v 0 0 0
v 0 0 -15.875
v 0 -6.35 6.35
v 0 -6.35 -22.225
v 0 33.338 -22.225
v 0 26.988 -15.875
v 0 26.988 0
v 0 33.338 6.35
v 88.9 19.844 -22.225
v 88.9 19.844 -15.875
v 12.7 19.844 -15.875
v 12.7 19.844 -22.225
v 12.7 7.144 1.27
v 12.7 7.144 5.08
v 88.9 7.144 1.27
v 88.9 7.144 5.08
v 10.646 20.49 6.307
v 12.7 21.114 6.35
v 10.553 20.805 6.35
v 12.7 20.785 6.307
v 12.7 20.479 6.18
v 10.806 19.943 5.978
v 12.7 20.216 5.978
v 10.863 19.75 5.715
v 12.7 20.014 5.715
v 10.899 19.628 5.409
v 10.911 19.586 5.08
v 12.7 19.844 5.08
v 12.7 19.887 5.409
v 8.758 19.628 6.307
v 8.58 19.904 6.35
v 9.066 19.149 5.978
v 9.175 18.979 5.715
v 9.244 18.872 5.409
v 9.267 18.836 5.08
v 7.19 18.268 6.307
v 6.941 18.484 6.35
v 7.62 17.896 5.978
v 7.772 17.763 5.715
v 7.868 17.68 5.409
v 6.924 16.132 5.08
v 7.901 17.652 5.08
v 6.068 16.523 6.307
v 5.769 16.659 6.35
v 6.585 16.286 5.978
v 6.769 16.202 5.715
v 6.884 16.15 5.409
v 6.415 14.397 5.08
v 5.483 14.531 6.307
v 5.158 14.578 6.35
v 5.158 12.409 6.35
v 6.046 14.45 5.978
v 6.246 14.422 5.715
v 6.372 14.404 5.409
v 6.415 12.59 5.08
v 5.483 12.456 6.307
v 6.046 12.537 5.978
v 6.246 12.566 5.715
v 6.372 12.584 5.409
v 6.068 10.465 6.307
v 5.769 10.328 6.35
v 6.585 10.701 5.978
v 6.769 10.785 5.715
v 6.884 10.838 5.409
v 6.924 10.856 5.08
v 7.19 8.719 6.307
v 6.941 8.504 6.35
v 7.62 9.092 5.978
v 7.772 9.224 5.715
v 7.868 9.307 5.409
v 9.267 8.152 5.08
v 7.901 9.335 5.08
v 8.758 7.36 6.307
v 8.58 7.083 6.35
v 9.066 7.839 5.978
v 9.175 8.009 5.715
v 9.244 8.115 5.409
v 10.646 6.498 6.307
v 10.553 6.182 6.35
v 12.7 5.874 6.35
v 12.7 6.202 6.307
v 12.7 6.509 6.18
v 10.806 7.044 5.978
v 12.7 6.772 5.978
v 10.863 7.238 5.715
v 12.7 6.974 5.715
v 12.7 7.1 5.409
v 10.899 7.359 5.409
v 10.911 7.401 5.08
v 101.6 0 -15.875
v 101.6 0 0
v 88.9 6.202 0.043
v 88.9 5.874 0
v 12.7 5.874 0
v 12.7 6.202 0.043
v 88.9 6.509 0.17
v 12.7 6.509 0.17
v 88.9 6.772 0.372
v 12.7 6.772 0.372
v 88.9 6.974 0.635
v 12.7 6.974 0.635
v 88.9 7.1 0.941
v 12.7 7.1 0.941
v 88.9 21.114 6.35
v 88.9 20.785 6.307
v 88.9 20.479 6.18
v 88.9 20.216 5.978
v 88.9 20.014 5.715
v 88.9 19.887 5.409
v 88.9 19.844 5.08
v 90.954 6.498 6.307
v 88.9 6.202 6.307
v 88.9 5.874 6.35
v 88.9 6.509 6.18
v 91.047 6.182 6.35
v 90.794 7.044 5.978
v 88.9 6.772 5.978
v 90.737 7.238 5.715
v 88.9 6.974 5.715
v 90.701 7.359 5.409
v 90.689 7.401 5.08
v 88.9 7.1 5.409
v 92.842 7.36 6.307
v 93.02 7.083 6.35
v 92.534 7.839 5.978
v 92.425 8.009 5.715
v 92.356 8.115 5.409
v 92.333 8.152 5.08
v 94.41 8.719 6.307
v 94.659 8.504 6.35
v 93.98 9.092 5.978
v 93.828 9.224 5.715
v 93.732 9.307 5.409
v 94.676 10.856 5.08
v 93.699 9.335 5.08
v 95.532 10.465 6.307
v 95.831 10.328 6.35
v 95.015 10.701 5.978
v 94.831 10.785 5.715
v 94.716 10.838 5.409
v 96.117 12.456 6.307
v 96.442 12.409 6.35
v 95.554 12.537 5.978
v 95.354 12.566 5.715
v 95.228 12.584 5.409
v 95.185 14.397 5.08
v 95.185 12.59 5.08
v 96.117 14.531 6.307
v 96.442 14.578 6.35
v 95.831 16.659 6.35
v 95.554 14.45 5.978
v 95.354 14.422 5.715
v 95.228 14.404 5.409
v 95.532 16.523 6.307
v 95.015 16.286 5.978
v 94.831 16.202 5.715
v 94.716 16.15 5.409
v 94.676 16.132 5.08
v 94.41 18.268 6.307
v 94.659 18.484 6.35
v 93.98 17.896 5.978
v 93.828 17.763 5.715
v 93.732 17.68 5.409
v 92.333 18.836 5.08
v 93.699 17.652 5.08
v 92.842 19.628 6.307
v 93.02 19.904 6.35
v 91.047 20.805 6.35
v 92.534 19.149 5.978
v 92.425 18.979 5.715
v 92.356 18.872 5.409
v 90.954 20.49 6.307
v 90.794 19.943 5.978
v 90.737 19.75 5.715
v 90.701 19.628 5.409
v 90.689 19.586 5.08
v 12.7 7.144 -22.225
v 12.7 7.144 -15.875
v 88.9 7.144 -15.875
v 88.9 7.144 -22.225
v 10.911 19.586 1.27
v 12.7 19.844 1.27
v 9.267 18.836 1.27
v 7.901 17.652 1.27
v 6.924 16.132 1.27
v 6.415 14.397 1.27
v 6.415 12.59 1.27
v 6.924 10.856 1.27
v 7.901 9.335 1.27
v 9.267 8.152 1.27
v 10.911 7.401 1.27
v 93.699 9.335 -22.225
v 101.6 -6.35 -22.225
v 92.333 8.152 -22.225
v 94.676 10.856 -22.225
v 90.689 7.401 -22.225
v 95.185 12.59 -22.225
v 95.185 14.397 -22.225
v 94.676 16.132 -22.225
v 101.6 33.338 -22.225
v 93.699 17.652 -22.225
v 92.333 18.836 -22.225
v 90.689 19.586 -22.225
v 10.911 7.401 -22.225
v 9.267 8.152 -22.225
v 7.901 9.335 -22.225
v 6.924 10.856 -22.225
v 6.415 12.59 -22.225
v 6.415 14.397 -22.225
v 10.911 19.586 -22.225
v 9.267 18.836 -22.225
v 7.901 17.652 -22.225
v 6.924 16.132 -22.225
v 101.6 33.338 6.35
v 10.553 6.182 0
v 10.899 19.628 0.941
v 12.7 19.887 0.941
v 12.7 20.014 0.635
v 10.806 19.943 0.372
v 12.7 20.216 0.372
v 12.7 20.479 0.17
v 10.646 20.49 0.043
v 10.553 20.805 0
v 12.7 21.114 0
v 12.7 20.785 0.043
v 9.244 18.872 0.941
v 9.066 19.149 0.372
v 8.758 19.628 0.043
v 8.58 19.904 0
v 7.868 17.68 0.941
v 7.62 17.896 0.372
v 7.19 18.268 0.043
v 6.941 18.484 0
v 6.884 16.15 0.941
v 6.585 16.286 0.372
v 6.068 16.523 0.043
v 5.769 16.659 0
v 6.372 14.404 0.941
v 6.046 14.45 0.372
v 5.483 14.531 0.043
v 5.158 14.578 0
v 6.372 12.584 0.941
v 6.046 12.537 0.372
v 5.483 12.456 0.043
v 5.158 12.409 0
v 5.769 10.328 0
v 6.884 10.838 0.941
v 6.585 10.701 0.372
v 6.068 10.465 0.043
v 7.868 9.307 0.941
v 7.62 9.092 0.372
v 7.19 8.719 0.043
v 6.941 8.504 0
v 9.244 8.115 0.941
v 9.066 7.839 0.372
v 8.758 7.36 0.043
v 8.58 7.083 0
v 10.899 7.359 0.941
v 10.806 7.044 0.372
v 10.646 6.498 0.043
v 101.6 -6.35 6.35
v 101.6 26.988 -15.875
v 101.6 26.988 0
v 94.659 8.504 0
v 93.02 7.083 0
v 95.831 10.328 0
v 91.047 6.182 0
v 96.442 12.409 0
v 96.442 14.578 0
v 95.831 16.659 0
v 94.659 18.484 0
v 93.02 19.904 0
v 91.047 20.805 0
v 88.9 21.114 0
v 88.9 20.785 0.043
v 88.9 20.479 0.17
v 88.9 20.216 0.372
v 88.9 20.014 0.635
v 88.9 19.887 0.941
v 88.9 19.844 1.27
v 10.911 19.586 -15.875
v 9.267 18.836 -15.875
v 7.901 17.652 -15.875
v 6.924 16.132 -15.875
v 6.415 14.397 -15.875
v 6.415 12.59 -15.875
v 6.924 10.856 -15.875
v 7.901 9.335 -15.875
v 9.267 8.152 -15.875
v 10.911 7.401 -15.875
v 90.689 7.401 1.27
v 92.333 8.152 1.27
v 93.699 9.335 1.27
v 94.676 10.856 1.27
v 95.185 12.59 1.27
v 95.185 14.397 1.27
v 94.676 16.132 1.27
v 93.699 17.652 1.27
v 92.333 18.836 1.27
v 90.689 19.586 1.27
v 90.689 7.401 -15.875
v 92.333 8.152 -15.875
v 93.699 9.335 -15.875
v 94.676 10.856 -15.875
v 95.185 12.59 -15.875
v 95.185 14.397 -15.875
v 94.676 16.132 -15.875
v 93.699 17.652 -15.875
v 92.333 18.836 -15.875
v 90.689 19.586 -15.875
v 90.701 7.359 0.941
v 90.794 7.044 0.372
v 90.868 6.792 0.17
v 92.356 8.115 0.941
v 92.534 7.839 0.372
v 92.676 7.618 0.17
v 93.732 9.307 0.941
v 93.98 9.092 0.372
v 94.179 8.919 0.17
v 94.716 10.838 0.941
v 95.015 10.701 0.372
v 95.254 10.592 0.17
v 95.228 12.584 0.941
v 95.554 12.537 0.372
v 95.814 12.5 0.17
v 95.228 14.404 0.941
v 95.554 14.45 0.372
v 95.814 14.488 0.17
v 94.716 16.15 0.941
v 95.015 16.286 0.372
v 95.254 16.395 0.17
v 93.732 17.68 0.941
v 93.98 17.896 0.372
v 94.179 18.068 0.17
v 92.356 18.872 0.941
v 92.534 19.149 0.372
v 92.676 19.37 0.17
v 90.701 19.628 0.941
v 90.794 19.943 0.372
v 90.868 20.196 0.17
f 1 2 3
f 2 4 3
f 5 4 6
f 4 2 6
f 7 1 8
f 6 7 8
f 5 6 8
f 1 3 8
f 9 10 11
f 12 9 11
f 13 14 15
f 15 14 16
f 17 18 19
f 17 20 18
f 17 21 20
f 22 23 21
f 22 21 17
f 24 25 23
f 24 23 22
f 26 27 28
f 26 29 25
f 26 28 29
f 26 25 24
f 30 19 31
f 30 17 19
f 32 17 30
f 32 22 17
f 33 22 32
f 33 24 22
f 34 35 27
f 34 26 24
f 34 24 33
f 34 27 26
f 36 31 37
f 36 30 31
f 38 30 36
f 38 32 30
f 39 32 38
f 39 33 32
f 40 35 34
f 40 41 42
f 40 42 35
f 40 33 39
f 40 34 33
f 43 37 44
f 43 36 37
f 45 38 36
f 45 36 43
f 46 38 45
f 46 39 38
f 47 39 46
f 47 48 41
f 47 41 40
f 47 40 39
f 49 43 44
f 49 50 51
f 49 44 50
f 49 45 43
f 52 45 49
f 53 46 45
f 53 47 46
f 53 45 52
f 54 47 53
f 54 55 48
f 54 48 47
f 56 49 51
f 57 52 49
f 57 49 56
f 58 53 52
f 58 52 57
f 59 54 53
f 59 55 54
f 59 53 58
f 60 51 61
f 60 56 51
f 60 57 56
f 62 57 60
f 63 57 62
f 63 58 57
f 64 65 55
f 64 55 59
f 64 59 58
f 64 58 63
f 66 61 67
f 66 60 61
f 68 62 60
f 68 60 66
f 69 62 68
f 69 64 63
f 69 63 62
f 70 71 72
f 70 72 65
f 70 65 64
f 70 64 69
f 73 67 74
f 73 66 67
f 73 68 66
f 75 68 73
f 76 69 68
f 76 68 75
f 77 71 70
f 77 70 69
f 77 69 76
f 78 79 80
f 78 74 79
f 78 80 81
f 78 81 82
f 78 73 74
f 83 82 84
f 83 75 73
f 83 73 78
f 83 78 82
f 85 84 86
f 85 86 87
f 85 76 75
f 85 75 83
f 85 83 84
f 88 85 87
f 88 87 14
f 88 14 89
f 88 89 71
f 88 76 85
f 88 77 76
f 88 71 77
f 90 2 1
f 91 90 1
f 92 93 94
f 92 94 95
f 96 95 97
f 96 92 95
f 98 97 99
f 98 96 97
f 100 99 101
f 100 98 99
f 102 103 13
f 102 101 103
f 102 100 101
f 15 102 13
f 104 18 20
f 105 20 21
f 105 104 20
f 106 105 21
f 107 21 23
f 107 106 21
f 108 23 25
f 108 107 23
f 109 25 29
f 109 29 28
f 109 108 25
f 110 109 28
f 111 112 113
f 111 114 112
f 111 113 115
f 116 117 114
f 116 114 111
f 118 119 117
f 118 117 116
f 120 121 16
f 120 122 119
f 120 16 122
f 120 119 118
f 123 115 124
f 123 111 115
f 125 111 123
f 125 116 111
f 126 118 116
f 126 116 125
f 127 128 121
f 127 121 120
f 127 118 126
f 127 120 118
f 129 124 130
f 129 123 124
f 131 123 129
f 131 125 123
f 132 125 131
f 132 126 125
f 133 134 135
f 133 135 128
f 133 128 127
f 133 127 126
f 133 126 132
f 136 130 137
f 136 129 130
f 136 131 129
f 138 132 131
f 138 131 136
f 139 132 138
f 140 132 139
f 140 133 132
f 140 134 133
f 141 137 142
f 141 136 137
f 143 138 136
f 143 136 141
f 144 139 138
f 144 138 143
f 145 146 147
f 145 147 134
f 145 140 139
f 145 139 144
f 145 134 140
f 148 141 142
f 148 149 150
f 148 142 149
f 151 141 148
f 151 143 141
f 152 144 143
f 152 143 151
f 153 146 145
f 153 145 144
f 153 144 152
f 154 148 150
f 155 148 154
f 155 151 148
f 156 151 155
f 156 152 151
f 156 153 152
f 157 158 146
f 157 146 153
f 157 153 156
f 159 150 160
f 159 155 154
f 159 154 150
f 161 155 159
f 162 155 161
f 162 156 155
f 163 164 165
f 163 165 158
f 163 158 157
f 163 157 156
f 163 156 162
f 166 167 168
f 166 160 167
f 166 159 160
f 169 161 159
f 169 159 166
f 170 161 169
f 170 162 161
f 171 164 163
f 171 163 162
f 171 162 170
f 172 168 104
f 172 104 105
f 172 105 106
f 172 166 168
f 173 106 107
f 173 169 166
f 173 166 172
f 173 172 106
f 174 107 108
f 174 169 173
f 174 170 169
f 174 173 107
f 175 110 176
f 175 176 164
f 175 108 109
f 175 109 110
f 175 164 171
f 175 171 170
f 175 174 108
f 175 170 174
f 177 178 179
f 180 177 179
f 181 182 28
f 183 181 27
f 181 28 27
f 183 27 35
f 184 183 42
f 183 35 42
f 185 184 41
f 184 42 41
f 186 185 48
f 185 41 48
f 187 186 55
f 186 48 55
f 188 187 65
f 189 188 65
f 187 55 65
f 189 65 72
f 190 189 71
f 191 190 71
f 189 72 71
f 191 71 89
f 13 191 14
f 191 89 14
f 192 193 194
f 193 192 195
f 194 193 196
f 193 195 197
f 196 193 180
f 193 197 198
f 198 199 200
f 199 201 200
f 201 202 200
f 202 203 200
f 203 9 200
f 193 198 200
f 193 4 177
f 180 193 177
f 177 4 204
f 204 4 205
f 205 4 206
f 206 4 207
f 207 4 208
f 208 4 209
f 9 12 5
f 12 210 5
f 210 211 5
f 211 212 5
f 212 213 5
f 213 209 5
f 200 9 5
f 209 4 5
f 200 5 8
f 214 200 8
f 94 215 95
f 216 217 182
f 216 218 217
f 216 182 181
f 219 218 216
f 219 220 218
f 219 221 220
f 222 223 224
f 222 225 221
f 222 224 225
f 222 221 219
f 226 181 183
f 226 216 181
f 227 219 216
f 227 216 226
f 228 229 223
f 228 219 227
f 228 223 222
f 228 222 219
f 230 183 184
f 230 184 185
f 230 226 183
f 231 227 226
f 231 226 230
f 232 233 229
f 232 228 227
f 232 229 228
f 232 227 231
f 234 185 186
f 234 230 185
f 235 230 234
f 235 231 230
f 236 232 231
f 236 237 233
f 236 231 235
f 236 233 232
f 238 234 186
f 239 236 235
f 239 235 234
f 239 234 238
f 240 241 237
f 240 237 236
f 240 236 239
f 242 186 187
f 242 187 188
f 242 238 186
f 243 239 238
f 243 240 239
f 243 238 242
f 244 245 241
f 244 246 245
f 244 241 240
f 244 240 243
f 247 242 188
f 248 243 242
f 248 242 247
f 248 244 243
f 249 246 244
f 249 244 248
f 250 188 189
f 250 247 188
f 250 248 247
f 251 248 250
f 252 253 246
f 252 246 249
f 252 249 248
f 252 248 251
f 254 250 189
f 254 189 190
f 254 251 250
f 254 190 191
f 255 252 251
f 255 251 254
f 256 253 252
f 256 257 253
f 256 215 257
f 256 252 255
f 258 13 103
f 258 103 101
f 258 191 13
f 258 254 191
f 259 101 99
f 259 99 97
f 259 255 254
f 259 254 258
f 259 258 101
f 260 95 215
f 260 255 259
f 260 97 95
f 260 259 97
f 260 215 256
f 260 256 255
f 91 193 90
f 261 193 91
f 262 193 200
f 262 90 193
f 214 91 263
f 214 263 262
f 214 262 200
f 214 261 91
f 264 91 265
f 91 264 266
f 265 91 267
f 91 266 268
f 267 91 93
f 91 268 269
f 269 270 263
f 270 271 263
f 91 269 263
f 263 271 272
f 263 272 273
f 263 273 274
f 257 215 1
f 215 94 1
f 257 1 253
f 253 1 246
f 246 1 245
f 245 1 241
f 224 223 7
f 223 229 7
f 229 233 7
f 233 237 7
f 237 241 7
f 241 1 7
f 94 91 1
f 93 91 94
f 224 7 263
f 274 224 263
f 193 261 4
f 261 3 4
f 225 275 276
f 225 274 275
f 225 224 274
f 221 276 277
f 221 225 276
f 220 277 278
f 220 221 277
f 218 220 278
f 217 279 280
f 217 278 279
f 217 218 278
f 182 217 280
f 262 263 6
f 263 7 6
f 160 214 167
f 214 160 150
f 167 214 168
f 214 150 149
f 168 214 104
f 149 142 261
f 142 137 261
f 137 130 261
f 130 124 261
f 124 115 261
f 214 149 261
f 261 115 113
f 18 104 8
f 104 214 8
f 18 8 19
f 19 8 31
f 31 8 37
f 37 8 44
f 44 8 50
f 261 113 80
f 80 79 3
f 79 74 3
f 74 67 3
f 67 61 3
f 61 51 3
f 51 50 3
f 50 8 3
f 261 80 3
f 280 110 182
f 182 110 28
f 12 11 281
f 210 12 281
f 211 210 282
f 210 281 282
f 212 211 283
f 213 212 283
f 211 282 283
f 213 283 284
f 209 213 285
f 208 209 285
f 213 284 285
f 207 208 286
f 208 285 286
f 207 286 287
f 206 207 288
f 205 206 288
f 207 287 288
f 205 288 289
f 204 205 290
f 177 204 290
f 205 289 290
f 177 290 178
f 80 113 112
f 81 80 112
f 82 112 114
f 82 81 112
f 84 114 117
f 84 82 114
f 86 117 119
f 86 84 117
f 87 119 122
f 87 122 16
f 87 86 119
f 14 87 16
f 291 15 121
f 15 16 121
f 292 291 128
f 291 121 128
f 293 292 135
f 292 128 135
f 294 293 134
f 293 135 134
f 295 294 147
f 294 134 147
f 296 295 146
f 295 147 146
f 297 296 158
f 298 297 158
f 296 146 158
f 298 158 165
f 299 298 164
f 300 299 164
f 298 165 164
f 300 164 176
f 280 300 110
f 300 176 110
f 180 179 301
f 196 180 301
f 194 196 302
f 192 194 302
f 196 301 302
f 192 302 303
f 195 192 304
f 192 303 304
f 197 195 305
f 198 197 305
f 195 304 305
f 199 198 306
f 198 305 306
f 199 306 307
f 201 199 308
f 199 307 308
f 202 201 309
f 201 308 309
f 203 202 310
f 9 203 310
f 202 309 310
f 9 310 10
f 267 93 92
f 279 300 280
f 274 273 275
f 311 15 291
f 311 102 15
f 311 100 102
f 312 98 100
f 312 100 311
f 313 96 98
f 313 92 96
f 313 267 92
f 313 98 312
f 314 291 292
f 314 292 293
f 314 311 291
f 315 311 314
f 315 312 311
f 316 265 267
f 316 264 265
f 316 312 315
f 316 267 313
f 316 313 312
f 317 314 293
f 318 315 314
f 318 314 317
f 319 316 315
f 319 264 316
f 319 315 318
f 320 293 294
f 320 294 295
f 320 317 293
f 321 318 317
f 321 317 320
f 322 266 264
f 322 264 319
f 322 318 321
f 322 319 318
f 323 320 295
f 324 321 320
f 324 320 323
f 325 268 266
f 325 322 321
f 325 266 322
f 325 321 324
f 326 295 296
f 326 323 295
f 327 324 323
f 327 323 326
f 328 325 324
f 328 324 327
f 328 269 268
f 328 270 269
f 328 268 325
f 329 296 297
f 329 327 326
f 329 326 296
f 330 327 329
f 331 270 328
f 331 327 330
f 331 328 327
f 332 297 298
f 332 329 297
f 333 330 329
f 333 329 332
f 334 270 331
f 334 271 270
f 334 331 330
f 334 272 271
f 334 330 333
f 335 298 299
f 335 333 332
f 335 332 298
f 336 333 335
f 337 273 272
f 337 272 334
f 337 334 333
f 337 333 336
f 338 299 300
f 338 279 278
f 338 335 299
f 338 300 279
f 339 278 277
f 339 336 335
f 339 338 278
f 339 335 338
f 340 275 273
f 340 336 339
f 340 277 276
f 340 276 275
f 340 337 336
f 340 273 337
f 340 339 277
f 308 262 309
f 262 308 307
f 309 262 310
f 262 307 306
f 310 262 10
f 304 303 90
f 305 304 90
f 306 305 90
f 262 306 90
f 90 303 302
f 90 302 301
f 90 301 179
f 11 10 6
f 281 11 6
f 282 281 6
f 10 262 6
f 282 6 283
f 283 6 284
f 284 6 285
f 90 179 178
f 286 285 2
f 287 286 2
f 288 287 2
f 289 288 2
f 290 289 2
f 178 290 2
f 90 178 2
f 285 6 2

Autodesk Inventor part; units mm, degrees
ref_plane "YZ Plane" through (0, 0, 0) normal (1, 0, 0) x (0, 1, 0)
ref_plane "XZ Plane" through (0, 0, 0) normal (0, 1, 0) x (-1, 0, 0)
ref_plane "XY Plane" through (0, 0, 0) normal (0, 0, 1) x (1, 0, 0)
sketch "Sketch1" plane through (0, 0, 0) normal (1, 0, 0) x (0, 1, 0)
  line L0 (0, 0) -> (26.9875, 0)
  line L1 (26.9875, 0) -> (26.9875, -15.875)
  line L2 (26.9875, -15.875) -> (0, -15.875)
  line L3 (0, -15.875) -> (0, 0)
  line L4 (33.3375, -22.225) -> (33.3375, 6.35)
  line L5 (33.3375, 6.35) -> (-6.35, 6.35)
  line L6 (-6.35, 6.35) -> (-6.35, -22.225)
  line L7 (-6.35, -22.225) -> (33.3375, -22.225)
  dimension "d0" = 26.9875
  dimension "d1" = 15.875
  dimension "d2" = 6.35
extrude "Extrusion1" add sketch "Sketch1" along normal blind 101.6
sketch "Sketch2" plane through (0, -6.35, 6.35) normal (0, 0, 1) x (1, 0, 0)
  line L0 (0, 39.6875) -> (0, 0) projected
  line L1 (0, 19.8437) -> (101.6, 19.8437)
  line L2 (101.6, 39.6875) -> (101.6, 0) projected
  circle A0 centre (12.7, 19.8437) radius 6.35
  line L3 (50.8, 39.6875) -> (50.8, 0)
  line L4 (0, 0) -> (101.6, 0) projected
  circle A1 centre (88.9, 19.8437) radius 6.35
  line L5 (88.9, 26.1937) -> (12.7, 26.1937)
  line L6 (12.7, 13.4937) -> (88.9, 13.4937)
  point P0 (0, 6.35)
  dimension "d5" = 12.7
  dimension "d6" = 12.7
  dimension "d7" = 50.8
extrude "Extrusion2" cut sketch "Sketch2" against normal through all contours A0 L1 | L1 A0 | A0 L5 L3 L1 | L1 L3 L6 A0 | L3 L1 A1 L6 | L3 L5 A1 L1 | A1 L1 | A1 L1
fillet "Fillet1" radius 1.27 4 edges at (6.35, 13.4938, 6.35) (50.8, 19.8438, 6.35) (95.25, 13.4938, 6.35) (50.8, 7.1438, 6.35)
fillet "Fillet2" radius 1.27 4 edges at (50.8, 7.1438, 0) (95.25, 13.4938, 0) (50.8, 19.8438, 0) (6.35, 13.4938, 0)
properties part number "housing"
